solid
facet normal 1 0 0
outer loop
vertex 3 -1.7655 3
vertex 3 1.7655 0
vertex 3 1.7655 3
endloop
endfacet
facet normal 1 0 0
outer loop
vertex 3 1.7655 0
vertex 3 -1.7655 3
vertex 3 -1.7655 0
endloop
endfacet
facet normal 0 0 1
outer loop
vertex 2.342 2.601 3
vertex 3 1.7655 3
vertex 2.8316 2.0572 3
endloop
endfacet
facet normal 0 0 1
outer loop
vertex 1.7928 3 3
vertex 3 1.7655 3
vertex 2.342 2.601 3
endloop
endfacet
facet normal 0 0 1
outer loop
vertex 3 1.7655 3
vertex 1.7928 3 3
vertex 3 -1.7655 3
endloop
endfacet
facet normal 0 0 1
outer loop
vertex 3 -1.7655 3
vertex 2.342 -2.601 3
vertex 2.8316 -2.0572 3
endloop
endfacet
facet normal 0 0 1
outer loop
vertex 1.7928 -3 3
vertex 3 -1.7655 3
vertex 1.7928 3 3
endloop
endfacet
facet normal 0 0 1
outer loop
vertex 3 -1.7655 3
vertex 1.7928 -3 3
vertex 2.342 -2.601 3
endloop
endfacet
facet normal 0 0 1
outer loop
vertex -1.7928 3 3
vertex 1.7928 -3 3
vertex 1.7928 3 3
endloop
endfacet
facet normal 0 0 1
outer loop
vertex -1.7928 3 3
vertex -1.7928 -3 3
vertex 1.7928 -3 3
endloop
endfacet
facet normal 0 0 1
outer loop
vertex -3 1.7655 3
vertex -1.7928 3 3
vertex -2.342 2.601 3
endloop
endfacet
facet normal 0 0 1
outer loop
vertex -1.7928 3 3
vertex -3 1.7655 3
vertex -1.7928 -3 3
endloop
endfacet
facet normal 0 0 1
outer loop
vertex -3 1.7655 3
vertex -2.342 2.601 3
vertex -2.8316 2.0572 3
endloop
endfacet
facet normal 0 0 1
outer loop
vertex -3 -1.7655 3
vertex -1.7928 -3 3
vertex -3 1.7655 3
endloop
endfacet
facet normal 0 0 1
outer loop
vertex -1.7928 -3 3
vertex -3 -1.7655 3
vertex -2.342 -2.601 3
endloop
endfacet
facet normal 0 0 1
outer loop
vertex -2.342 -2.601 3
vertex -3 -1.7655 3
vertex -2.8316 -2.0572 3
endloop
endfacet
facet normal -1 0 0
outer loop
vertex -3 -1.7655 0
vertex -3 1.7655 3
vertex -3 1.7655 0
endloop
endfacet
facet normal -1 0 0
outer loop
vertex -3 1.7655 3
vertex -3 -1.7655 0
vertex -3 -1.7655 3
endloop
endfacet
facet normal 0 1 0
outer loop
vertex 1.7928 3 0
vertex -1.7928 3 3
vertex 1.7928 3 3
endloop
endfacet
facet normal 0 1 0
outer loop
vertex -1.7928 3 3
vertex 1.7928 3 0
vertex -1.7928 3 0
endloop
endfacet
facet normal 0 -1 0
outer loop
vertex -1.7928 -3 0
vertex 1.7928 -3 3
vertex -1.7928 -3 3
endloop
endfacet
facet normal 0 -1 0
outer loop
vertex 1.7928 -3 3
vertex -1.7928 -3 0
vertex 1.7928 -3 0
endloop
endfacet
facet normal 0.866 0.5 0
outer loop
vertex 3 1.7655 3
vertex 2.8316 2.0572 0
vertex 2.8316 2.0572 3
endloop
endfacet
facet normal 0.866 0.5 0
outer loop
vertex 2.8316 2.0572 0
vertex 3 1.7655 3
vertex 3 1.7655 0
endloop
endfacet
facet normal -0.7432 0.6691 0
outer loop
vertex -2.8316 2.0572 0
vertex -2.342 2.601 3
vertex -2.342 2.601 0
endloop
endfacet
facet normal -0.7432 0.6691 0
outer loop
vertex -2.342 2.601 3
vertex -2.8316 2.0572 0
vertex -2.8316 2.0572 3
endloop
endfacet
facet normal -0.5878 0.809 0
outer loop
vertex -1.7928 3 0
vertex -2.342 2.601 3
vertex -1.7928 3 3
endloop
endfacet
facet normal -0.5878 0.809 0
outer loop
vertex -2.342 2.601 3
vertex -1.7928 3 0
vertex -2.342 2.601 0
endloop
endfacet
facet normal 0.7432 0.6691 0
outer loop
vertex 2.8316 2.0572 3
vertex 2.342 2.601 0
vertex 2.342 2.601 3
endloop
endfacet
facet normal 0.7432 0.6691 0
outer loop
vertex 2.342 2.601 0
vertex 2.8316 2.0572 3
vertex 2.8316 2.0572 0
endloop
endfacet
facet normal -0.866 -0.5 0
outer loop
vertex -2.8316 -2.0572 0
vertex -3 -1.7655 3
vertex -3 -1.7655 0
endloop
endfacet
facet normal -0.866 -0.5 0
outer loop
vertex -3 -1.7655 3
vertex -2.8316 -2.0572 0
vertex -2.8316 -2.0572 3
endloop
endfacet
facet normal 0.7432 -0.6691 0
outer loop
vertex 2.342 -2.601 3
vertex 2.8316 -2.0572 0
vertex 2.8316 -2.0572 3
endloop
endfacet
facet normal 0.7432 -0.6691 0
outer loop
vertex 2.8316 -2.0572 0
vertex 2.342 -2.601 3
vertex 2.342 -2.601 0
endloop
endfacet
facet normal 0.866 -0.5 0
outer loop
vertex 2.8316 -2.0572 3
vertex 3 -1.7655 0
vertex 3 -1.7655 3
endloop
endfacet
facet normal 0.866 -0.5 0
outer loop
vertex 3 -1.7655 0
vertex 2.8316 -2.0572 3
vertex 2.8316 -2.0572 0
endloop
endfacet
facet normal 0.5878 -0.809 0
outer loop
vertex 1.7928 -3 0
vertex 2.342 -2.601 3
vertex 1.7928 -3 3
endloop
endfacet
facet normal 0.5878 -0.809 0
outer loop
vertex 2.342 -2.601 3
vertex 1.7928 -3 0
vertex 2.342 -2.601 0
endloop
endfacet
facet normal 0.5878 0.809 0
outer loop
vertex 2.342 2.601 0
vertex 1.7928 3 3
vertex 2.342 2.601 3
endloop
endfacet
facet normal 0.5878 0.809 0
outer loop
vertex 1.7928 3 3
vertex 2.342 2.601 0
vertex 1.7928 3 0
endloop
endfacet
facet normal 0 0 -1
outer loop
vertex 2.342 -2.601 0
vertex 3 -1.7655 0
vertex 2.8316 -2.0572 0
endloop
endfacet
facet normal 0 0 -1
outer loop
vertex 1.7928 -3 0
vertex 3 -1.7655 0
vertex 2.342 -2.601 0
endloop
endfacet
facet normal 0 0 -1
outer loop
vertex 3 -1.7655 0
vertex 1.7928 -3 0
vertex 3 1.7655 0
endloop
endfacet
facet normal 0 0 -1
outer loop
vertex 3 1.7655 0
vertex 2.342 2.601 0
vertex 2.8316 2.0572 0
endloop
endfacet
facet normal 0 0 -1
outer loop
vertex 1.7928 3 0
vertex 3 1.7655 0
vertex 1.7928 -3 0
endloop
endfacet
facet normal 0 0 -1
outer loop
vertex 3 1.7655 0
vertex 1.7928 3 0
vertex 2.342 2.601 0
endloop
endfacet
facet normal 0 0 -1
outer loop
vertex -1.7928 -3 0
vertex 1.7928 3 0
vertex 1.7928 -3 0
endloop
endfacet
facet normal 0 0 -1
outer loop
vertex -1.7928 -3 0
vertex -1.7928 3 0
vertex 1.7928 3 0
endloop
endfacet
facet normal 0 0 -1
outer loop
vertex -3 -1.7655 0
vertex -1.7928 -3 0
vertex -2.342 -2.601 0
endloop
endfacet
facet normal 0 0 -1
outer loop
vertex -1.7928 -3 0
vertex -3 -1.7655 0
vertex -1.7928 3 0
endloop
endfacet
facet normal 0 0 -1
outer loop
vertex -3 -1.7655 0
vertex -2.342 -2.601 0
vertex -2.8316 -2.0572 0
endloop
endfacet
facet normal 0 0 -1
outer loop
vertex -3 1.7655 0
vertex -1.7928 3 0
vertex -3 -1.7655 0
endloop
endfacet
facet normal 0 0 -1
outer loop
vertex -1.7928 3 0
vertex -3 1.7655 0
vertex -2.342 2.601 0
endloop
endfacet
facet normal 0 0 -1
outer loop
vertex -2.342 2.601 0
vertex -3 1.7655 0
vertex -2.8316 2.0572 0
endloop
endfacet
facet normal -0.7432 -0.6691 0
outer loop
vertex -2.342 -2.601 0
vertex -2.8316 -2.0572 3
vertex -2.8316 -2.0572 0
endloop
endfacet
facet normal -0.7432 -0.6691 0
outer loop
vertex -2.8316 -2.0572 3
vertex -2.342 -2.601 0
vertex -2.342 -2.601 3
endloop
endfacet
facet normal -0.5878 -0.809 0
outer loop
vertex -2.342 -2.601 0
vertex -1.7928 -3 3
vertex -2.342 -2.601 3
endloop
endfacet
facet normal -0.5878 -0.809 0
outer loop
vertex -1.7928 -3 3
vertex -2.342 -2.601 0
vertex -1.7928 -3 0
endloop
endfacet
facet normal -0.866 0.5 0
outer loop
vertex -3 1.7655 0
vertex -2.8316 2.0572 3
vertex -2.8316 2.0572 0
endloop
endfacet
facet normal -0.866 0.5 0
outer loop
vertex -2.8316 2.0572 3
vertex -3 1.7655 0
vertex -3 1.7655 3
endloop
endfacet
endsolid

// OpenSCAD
$fn = 30;

//cylinder(h=3, r=3.5);
//cube([6,6,6], center=true);

/*
difference() {
  cube([6,6,6], center=true);     
    cylinder(h=3, r=3.5);
  
    
}*/


intersection() {
  cube([6,6,6], center=true);     
    cylinder(h=3, r=3.5);
  
}
